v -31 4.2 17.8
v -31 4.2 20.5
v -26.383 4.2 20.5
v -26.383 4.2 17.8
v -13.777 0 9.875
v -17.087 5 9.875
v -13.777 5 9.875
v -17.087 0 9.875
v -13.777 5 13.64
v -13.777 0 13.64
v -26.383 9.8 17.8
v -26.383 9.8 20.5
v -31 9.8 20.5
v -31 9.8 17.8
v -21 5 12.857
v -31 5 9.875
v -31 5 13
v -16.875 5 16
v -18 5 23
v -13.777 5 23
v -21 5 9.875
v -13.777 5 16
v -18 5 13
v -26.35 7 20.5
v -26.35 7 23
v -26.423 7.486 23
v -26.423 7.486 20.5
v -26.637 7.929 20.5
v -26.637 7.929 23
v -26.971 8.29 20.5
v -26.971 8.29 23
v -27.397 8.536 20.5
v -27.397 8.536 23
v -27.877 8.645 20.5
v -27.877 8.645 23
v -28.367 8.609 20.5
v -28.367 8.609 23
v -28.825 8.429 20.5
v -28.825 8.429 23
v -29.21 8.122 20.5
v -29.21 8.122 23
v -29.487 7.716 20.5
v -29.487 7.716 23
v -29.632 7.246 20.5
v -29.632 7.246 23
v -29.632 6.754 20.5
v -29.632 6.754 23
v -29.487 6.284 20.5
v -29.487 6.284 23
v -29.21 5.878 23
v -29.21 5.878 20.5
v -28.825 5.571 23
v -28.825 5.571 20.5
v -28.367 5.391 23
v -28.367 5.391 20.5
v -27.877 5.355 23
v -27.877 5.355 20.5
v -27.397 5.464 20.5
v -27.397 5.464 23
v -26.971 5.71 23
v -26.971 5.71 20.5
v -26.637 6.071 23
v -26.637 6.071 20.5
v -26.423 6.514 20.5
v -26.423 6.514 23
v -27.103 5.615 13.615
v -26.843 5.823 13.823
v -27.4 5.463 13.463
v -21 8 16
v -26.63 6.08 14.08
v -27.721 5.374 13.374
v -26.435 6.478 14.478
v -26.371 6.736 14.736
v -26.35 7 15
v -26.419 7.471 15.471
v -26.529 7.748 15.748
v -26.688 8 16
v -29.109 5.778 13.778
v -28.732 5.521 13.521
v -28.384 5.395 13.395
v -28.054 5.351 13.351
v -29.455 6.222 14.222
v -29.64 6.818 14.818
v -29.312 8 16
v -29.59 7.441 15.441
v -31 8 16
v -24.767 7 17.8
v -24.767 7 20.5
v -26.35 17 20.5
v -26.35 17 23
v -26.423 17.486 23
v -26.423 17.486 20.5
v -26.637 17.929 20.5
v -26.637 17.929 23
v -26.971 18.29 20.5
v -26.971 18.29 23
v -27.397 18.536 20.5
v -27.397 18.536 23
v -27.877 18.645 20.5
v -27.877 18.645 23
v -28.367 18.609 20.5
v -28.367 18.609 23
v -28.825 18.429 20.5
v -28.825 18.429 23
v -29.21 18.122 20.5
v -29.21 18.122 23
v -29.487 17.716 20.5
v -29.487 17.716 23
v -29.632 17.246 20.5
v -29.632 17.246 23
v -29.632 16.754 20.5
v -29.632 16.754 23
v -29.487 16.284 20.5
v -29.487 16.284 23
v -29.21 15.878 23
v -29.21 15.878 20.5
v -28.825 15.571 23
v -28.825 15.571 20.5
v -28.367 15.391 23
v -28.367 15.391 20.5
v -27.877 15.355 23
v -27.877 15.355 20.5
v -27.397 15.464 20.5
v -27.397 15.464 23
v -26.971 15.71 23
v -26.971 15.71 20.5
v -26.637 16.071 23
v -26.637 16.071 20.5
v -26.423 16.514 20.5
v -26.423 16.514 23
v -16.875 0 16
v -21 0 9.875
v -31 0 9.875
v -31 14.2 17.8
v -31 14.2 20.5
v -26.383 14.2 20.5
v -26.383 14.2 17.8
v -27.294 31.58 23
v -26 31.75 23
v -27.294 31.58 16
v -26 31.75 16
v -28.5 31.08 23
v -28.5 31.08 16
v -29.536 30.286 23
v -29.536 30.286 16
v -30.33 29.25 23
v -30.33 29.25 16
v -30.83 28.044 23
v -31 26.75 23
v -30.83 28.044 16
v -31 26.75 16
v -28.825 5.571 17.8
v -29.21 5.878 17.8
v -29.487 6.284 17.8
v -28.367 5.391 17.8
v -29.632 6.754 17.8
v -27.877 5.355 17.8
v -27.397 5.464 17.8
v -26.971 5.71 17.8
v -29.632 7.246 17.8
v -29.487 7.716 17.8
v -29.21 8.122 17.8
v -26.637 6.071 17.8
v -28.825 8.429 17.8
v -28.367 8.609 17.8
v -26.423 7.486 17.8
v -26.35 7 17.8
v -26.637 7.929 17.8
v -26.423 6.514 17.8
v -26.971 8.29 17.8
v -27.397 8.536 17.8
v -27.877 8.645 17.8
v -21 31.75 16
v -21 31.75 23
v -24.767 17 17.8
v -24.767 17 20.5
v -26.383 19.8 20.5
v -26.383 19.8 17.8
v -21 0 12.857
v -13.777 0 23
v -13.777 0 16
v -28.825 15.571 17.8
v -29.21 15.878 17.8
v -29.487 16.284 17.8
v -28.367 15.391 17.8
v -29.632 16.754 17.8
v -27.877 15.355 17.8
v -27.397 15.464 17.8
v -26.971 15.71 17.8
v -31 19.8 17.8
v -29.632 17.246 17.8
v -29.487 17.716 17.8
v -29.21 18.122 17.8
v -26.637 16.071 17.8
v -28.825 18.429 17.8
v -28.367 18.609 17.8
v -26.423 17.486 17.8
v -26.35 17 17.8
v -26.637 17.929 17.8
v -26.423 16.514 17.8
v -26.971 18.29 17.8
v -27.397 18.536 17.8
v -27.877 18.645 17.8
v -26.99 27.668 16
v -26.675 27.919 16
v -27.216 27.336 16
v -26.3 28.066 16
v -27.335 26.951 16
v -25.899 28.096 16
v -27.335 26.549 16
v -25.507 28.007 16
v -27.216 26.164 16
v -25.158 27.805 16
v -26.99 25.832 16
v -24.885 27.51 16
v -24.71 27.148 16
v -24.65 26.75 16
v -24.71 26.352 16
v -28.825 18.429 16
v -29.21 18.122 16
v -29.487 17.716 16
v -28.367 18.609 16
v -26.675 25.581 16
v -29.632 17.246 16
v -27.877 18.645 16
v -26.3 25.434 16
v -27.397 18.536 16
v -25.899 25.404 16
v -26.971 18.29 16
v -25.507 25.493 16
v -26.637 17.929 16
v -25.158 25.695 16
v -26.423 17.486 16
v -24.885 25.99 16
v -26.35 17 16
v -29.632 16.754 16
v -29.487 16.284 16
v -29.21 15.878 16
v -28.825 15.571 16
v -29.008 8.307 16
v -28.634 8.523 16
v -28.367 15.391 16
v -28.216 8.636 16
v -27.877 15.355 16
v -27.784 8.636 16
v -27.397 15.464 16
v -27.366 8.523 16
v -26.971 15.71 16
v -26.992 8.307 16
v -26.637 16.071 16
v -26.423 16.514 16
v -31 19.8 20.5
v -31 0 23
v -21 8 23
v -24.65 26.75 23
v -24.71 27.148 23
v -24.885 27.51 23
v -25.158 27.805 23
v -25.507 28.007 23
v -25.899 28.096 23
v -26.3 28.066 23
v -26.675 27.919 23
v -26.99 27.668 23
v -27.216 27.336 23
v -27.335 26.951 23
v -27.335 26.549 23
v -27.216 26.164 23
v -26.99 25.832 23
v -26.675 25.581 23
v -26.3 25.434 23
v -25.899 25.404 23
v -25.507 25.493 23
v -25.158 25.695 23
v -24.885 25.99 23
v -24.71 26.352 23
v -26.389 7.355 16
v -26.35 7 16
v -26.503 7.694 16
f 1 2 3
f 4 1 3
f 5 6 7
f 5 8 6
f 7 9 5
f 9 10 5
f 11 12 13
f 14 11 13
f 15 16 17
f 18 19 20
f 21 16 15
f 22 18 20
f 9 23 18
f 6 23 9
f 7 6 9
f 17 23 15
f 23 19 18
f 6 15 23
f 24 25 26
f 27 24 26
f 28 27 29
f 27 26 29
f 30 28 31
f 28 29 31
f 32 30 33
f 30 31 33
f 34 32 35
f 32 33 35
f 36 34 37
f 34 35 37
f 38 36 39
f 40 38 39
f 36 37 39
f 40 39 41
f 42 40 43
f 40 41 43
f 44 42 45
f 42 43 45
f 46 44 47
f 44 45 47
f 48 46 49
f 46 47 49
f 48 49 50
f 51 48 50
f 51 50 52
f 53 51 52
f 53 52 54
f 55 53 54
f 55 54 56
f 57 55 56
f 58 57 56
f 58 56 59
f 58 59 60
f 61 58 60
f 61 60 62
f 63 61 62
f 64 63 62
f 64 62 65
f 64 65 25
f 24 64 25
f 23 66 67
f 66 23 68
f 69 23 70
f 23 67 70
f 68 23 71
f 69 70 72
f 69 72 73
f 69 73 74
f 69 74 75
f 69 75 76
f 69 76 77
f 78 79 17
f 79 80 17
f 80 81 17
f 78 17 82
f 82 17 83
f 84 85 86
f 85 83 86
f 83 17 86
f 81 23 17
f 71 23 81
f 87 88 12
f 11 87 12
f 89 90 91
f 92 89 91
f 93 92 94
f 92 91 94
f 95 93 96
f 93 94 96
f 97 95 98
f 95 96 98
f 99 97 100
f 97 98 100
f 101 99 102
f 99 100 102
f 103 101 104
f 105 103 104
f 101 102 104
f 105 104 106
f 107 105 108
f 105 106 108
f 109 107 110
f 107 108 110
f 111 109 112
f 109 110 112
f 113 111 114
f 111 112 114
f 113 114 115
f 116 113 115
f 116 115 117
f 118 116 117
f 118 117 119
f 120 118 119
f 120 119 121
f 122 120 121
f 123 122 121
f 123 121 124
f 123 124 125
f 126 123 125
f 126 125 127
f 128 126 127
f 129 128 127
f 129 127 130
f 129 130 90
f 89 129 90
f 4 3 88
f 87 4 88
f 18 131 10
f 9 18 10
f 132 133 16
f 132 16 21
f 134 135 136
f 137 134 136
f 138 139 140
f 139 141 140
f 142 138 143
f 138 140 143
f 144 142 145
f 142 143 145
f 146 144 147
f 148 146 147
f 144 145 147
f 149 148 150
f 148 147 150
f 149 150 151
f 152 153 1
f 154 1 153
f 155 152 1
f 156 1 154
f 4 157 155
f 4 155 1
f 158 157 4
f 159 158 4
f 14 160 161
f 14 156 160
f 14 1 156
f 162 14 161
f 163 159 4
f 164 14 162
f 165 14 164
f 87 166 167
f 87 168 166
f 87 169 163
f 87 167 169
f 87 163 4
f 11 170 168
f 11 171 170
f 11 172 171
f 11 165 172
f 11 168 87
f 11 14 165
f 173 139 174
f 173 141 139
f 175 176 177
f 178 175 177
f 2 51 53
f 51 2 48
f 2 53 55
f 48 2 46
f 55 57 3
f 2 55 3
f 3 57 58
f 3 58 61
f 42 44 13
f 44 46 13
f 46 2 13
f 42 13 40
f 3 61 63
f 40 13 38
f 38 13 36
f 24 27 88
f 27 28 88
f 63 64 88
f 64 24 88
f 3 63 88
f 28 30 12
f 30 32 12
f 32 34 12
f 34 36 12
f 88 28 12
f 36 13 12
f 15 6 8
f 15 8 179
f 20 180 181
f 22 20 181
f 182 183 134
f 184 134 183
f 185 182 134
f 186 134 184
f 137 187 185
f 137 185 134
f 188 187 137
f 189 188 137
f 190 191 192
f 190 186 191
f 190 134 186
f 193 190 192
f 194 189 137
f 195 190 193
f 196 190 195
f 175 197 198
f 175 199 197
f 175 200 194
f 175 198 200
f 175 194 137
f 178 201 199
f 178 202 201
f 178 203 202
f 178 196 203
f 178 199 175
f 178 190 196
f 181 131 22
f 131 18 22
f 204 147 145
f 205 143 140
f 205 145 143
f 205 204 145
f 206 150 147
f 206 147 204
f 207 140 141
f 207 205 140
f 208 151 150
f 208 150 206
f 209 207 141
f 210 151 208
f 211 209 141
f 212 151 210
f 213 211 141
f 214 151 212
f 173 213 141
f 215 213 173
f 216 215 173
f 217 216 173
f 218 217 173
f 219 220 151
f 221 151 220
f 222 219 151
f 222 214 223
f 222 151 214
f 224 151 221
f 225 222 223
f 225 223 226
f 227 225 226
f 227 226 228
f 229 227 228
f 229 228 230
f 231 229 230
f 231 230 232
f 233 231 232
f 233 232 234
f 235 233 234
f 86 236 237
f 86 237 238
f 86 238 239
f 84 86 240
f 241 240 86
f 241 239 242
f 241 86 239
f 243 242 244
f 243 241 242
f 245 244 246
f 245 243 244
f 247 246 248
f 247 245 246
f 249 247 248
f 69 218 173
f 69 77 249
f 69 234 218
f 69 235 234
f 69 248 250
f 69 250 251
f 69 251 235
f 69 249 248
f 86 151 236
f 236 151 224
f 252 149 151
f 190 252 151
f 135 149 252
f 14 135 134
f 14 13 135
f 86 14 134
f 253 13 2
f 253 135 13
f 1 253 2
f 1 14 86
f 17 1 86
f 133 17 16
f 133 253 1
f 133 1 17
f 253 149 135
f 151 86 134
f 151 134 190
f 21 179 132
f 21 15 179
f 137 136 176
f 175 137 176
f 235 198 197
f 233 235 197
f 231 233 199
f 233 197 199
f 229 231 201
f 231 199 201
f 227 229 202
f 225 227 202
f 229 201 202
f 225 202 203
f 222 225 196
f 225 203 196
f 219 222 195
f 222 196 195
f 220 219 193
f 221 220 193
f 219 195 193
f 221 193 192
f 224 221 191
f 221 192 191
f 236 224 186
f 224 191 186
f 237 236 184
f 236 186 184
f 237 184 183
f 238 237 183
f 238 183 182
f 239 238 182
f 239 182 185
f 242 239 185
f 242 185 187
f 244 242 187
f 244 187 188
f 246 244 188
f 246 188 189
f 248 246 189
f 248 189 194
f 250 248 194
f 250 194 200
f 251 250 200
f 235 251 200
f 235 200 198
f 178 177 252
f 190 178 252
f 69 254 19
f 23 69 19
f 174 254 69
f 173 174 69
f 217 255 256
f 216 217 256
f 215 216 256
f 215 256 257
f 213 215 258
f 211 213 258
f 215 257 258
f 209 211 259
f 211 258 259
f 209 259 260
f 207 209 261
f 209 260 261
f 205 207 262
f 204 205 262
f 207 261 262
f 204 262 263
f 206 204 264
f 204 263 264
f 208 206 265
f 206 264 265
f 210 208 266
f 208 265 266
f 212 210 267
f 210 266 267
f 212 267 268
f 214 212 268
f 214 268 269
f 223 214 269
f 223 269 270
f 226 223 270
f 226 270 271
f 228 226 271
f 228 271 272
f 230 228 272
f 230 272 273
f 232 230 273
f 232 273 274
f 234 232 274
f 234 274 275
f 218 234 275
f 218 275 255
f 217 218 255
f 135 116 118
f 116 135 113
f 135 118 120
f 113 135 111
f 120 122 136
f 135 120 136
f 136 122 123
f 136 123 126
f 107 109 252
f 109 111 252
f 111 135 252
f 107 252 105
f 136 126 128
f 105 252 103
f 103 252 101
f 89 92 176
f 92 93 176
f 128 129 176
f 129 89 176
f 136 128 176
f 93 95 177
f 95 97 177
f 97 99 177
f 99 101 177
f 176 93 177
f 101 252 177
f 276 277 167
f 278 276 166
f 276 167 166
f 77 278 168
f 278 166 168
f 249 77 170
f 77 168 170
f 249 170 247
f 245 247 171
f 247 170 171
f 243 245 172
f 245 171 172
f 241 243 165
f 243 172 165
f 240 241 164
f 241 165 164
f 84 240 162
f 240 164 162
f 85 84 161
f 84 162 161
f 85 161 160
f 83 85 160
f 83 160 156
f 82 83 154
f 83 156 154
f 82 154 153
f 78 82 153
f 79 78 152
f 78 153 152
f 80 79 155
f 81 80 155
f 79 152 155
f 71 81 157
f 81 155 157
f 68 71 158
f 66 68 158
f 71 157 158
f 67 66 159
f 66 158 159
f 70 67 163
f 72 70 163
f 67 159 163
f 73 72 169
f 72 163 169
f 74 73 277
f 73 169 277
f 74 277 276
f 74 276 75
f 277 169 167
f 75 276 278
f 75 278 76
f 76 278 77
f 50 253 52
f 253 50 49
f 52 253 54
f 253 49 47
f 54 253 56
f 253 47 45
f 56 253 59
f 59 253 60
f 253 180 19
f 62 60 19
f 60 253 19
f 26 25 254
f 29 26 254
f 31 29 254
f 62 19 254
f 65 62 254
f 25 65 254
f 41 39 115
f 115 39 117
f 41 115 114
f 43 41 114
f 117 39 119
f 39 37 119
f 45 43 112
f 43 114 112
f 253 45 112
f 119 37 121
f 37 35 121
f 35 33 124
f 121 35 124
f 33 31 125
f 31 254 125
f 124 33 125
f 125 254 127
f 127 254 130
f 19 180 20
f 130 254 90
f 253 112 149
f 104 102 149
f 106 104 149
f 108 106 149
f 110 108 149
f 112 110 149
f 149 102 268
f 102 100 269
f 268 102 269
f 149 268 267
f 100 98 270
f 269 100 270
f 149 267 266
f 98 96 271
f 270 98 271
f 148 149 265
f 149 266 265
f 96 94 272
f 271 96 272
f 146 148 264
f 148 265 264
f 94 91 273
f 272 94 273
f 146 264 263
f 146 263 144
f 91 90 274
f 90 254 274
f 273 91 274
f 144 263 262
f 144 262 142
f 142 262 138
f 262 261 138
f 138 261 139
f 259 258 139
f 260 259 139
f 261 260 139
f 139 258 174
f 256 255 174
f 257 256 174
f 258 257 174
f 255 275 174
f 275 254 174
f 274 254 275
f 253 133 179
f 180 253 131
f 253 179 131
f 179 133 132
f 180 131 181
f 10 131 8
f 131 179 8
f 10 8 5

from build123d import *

# Parameters (mm, degrees)
SKETCH_1_W           = 62
SKETCH_1_H           = 46
EXTRUDE_1_DEPTH      = 5
SKETCH_2_W           = 10
SKETCH_2_H           = 17
EXTRUDE_2_DEPTH      = 7
SKETCH_3_R           = 1.65
CUT_EXTRUDE_1_DEPTH  = 12
SKETCH_7_W           = 10
SKETCH_7_H           = 7
EXTRUDE_4_DEPTH      = 9.75
CUT_EXTRUDE_4_REACH  = 65.914
SKETCH_8_R           = 1.35
CUT_EXTRUDE_2_DEPTH  = 2.7
CUT_EXTRUDE_3_REACH  = 51.981
SKETCH_5_W           = 42
SKETCH_5_H           = 32
EXTRUDE_3_DEPTH      = 5
CHAMFER_4_SIZE       = 3
FILLET_1_R           = 5
SKETCH_9_OUTSIDE_W   = 80.694
SKETCH_9_OUTSIDE_H   = 64.694
SKETCH_9_OUTSIDE_W_2 = 19.744354218
SKETCH_9_OUTSIDE_H_2 = 18.428063936
CUT_EXTRUDE_5_DEPTH  = 31.75


with BuildPart() as part:
    # 草图1 → 凸台-拉伸1 (new body)
    with BuildSketch(Plane(origin=(0, 0, 0), x_dir=(1, 0, 0), z_dir=(0, 1, 0))):
        Rectangle(SKETCH_1_W, SKETCH_1_H)
    extrude(amount=EXTRUDE_1_DEPTH)

    # 草图2 → 凸台-拉伸2 (add)
    with BuildSketch(Plane.XY.offset(23)):
        with Locations((-26, 13.5)):
            Rectangle(SKETCH_2_W, SKETCH_2_H)
        with Locations((26, 13.5)):
            Rectangle(SKETCH_2_W, SKETCH_2_H)
    extrude_2 = extrude(amount=-EXTRUDE_2_DEPTH)

    # 草图3 → 切除-拉伸1 (cut)
    with BuildSketch(Plane.XY.offset(23)):
        with Locations((-28, 17)):
            Circle(SKETCH_3_R)
        with Locations((-28, 7)):
            Circle(SKETCH_3_R)
        with Locations((28, 7)):
            Circle(SKETCH_3_R)
        with Locations((28, 17)):
            Circle(SKETCH_3_R)
    cut_extrude_1 = extrude(amount=-CUT_EXTRUDE_1_DEPTH, mode=Mode.SUBTRACT)

    # 草图7 → 凸台-拉伸4 (add)
    with BuildSketch(Plane(origin=(0, 22, 0), x_dir=(1, 0, 0), z_dir=(0, 1, 0))):
        with Locations((-26, -19.5)):
            Rectangle(SKETCH_7_W, SKETCH_7_H)
        with Locations((26, -19.5)):
            Rectangle(SKETCH_7_W, SKETCH_7_H)
    extrude_4 = extrude(amount=EXTRUDE_4_DEPTH)

    # 草图8 → 切除-拉伸4 (cut, up to next)
    with BuildSketch(Plane.XY.offset(23), mode=Mode.PRIVATE) as cut_extrude_4_sk1:
        with Locations((-26, 26.75)):
            Circle(SKETCH_8_R)
    cut_extrude_4_tool1 = extrude(cut_extrude_4_sk1.sketch, amount=-CUT_EXTRUDE_4_REACH, mode=Mode.PRIVATE) & part.part
    # 草图8 → 切除-拉伸4 (cut, up to next)
    with BuildSketch(Plane.XY.offset(23), mode=Mode.PRIVATE) as cut_extrude_4_sk2:
        with Locations((26, 26.75)):
            Circle(SKETCH_8_R)
    cut_extrude_4_tool2 = extrude(cut_extrude_4_sk2.sketch, amount=-CUT_EXTRUDE_4_REACH, mode=Mode.PRIVATE) & part.part
    cut_extrude_4_1 = cut_extrude_4_tool1.solids().sort_by_distance((-26, 26.75, 23))[0]
    add(cut_extrude_4_1, mode=Mode.SUBTRACT)
    cut_extrude_4_2 = cut_extrude_4_tool2.solids().sort_by_distance((26, 26.75, 23))[0]
    add(cut_extrude_4_2, mode=Mode.SUBTRACT)
    cut_extrude_4 = cut_extrude_4_1 + cut_extrude_4_2  # 切除-拉伸4 as one shape, for the pattern or mirror that repeats it

    # 草图4 → 切除-拉伸2 (cut)
    with BuildSketch(Plane.XY.offset(20.5)):
        Polygon((-29.616580754, 19.8), (-31.233161507, 19.8), (-31.233161507, 17), (-31.233161507, 14.2), (-29.616580754, 14.2), (-26.383419246, 14.2), (-24.766838493, 17), (-26.383419246, 19.8), align=None)
        Polygon((-24.766838493, 7), (-26.383419246, 9.8), (-29.616580754, 9.8), (-31.233161507, 9.8), (-31.233161507, 7), (-31.233161507, 4.2), (-29.616580754, 4.2), (-26.383419246, 4.2), align=None)
        Polygon((24.766838493, 17), (26.383419246, 14.2), (29.616580754, 14.2), (31.233161507, 14.2), (31.233161507, 17), (31.233161507, 19.8), (29.616580754, 19.8), (26.383419246, 19.8), align=None)
        Polygon((24.766838493, 7), (26.383419246, 4.2), (29.616580754, 4.2), (31.233161507, 4.2), (31.233161507, 7), (31.233161507, 9.8), (29.616580754, 9.8), (26.383419246, 9.8), align=None)
    cut_extrude_2 = extrude(amount=-CUT_EXTRUDE_2_DEPTH, mode=Mode.SUBTRACT)

    # 镜向1: 凸台-拉伸2, 切除-拉伸1, 凸台-拉伸4, 切除-拉伸4, 切除-拉伸2 across plane
    add(extrude_2.mirror(Plane.XY))
    add(cut_extrude_1.mirror(Plane.XY), mode=Mode.SUBTRACT)
    add(extrude_4.mirror(Plane.XY))
    add(cut_extrude_4.mirror(Plane.XY), mode=Mode.SUBTRACT)
    add(cut_extrude_2.mirror(Plane.XY), mode=Mode.SUBTRACT)

    # 草图5 → 切除-拉伸3 (cut, up to next)
    with BuildSketch(Plane(origin=(0, 31.75, 0), x_dir=(1, 0, 0), z_dir=(0, 1, 0)), mode=Mode.PRIVATE) as cut_extrude_3_sk1:
        Rectangle(SKETCH_5_W, SKETCH_5_H)
    cut_extrude_3_tool1 = extrude(cut_extrude_3_sk1.sketch, amount=-CUT_EXTRUDE_3_REACH, mode=Mode.PRIVATE) & part.part
    add(cut_extrude_3_tool1.solids().sort_by_distance((0, 31.75, 0))[0], mode=Mode.SUBTRACT)

    # 草图6 → 凸台-拉伸3 (add)
    with BuildSketch(Plane(origin=(0, 0, 0), x_dir=(1, 0, 0), z_dir=(0, 1, 0))):
        Polygon((-22.515108038, 14.0114207), (-4.12511837, 0), (0, 3.142947329), (-19.484891962, 17.9885793), align=None)
        Polygon((0, 3.142947329), (4.12511837, 0), (22.515108038, 14.0114207), (19.484891962, 17.9885793), align=None)
        Polygon((-4.12511837, 0), (0, -3.142947329), (4.12511837, 0), (0, 3.142947329), align=None)
        Polygon((-19.484891962, -17.9885793), (0, -3.142947329), (-4.12511837, 0), (-22.515108038, -14.0114207), align=None)
        Polygon((0, -3.142947329), (19.484891962, -17.9885793), (22.515108038, -14.0114207), (4.12511837, 0), align=None)
    extrude(amount=EXTRUDE_3_DEPTH)

    # 倒角4
    # the kernel refuses this chamfer: 3 mm, written as the material it adds along each edge
    with BuildSketch(Plane(origin=(-31, 5, 16), x_dir=(0, -0.027495876610586494, -0.9996219169112968), z_dir=(1, 0, 0))) as chamfer_4_piece_1_section:
        Polygon((CHAMFER_4_SIZE * 0.999621916911, CHAMFER_4_SIZE * 0.0274958766106), (-CHAMFER_4_SIZE * 0.0274958766106, CHAMFER_4_SIZE * 0.999621916911), (0, 0), align=None)
    chamfer_4_piece_1 = extrude(amount=10, mode=Mode.PRIVATE)
    chamfer_4_piece_1 = chamfer_4_piece_1 - Plane(origin=(-28, 7, 14.954388988), x_dir=(1, 0, 0), z_dir=(0, 0, 1)) * Cylinder(1.65, 32, mode=Mode.PRIVATE)
    add(chamfer_4_piece_1)
    with BuildSketch(Plane(origin=(-21, 5, 23), x_dir=(-0.02749587661058678, 0.9996219169112968, 0), z_dir=(0, 0, -1)), Plane(origin=(-21, 5, -23), x_dir=(0.9996219169112968, -0.02749587661058648, 0), z_dir=(0, 0, 1)), Plane(origin=(21, 5, 23), x_dir=(-0.9996219169112968, -0.02749587661058619, 0), z_dir=(0, 0, -1))) as chamfer_4_piece_2:
        Polygon((CHAMFER_4_SIZE * 0.999621916911, CHAMFER_4_SIZE * 0.0274958766106), (-CHAMFER_4_SIZE * 0.0274958766106, CHAMFER_4_SIZE * 0.999621916911), (0, 0), align=None)
    extrude(amount=7)
    with BuildSketch(Plane(origin=(-31, 5, -16), x_dir=(0, -0.027495876610586494, 0.9996219169112968), z_dir=(1, 0, 0))) as chamfer_4_piece_3_section:
        Polygon((CHAMFER_4_SIZE * 0.999621916911, -CHAMFER_4_SIZE * 0.0274958766106), (-CHAMFER_4_SIZE * 0.0274958766106, -CHAMFER_4_SIZE * 0.999621916911), (0, 0), align=None)
    chamfer_4_piece_3 = extrude(amount=10, mode=Mode.PRIVATE)
    chamfer_4_piece_3 = chamfer_4_piece_3 - Plane(origin=(-28, 7, -14.954388988), x_dir=(1, 0, 0), z_dir=(0, 0, -1)) * Cylinder(1.65, 32, mode=Mode.PRIVATE)
    add(chamfer_4_piece_3)
    with BuildSketch(Plane(origin=(21, 5, -23), x_dir=(-0.9996219169112968, -0.02749587661058619, 0), z_dir=(0, 0, 1))) as chamfer_4_piece_4:
        Polygon((CHAMFER_4_SIZE * 0.999621916911, -CHAMFER_4_SIZE * 0.0274958766106), (-CHAMFER_4_SIZE * 0.0274958766106, -CHAMFER_4_SIZE * 0.999621916911), (0, 0), align=None)
    extrude(amount=7)
    with BuildSketch(Plane(origin=(31, 5, -16), x_dir=(0, -0.027495876610586494, 0.9996219169112968), z_dir=(-1, 0, 0))) as chamfer_4_piece_5_section:
        Polygon((CHAMFER_4_SIZE * 0.999621916911, CHAMFER_4_SIZE * 0.0274958766106), (-CHAMFER_4_SIZE * 0.0274958766106, CHAMFER_4_SIZE * 0.999621916911), (0, 0), align=None)
    chamfer_4_piece_5 = extrude(amount=10, mode=Mode.PRIVATE)
    chamfer_4_piece_5 = chamfer_4_piece_5 - Plane(origin=(28, 7, -14.954389008), x_dir=(1, 0, 0), z_dir=(0, 0, -1)) * Cylinder(1.65, 32, mode=Mode.PRIVATE)
    add(chamfer_4_piece_5)
    with BuildSketch(Plane(origin=(31, 5, 16), x_dir=(0, -0.027495876610586494, -0.9996219169112968), z_dir=(-1, 0, 0))) as chamfer_4_piece_6_section:
        Polygon((CHAMFER_4_SIZE * 0.999621916911, -CHAMFER_4_SIZE * 0.0274958766106), (-CHAMFER_4_SIZE * 0.0274958766106, -CHAMFER_4_SIZE * 0.999621916911), (0, 0), align=None)
    chamfer_4_piece_6 = extrude(amount=10, mode=Mode.PRIVATE)
    chamfer_4_piece_6 = chamfer_4_piece_6 - Plane(origin=(28, 7, 14.954389008), x_dir=(1, 0, 0), z_dir=(0, 0, 1)) * Cylinder(1.65, 32, mode=Mode.PRIVATE)
    add(chamfer_4_piece_6)
    with BuildSketch(Plane(origin=(-21, 5, 23), x_dir=(-0.02749587661058678, 0.9996219169112968, 0), z_dir=(0, 0, -1))) as chamfer_4_piece_7a_section:
        Polygon((CHAMFER_4_SIZE * 0.999621916911, CHAMFER_4_SIZE * 0.0274958766106), (-CHAMFER_4_SIZE * 0.0274958766106, CHAMFER_4_SIZE * 0.999621916911), (0, 0), align=None)
    chamfer_4_piece_7a = extrude(amount=14.715048964, mode=Mode.PRIVATE)
    chamfer_4_piece_7a = split(chamfer_4_piece_7a, bisect_by=Plane(origin=(-19.8988735, 5.929641192, 16), z_dir=(0, 0, -1)), keep=Keep.TOP, mode=Mode.PRIVATE)
    chamfer_4_piece_7a = split(chamfer_4_piece_7a, bisect_by=Plane(origin=(-20.858643002, 5.929641192, 12.749352101), z_dir=(0.6060432152628566, 0, 0.7954317200324984)), keep=Keep.TOP, mode=Mode.PRIVATE)
    with BuildSketch(Plane(origin=(-31, 5, 16), x_dir=(0, -0.027495876610586494, -0.9996219169112968), z_dir=(1, 0, 0))) as chamfer_4_piece_7b_section:
        Polygon((CHAMFER_4_SIZE * 0.999621916911, CHAMFER_4_SIZE * 0.0274958766106), (-CHAMFER_4_SIZE * 0.0274958766106, CHAMFER_4_SIZE * 0.999621916911), (0, 0), align=None)
    chamfer_4_piece_7b = extrude(amount=17.715048964, mode=Mode.PRIVATE)
    chamfer_4_piece_7b = split(chamfer_4_piece_7b, bisect_by=Plane(origin=(-21, 5.915915897, 14.873215442), z_dir=(1, 0, 0)), keep=Keep.TOP, mode=Mode.PRIVATE)
    chamfer_4_piece_7b = split(chamfer_4_piece_7b, bisect_by=Plane(origin=(-17.170062576, 5.915915897, 16.224899768), z_dir=(-0.6060432152628568, 0, -0.7954317200324983)), keep=Keep.TOP, mode=Mode.PRIVATE)
    chamfer_4_piece_7 = chamfer_4_piece_7a & chamfer_4_piece_7b
    add(chamfer_4_piece_7)
    with BuildSketch(Plane(origin=(-21, 5, -23), x_dir=(0.9996219169112968, -0.02749587661058648, 0), z_dir=(0, 0, 1))) as chamfer_4_piece_8a_section:
        Polygon((CHAMFER_4_SIZE * 0.999621916911, CHAMFER_4_SIZE * 0.0274958766106), (-CHAMFER_4_SIZE * 0.0274958766106, CHAMFER_4_SIZE * 0.999621916911), (0, 0), align=None)
    chamfer_4_piece_8a = extrude(amount=14.715048964, mode=Mode.PRIVATE)
    chamfer_4_piece_8a = split(chamfer_4_piece_8a, bisect_by=Plane(origin=(-20.858643002, 5.929641192, -12.749352101), z_dir=(0.6060432152628563, 0, -0.7954317200324986)), keep=Keep.TOP, mode=Mode.PRIVATE)
    chamfer_4_piece_8a = split(chamfer_4_piece_8a, bisect_by=Plane(origin=(-19.8988735, 5.929641192, -16), z_dir=(0, 0, 1)), keep=Keep.TOP, mode=Mode.PRIVATE)
    with BuildSketch(Plane(origin=(-31, 5, -16), x_dir=(0, -0.027495876610586494, 0.9996219169112968), z_dir=(1, 0, 0))) as chamfer_4_piece_8b_section:
        Polygon((CHAMFER_4_SIZE * 0.999621916911, -CHAMFER_4_SIZE * 0.0274958766106), (-CHAMFER_4_SIZE * 0.0274958766106, -CHAMFER_4_SIZE * 0.999621916911), (0, 0), align=None)
    chamfer_4_piece_8b = extrude(amount=17.715048964, mode=Mode.PRIVATE)
    chamfer_4_piece_8b = split(chamfer_4_piece_8b, bisect_by=Plane(origin=(-17.170062576, 5.915915897, -16.224899768), z_dir=(-0.6060432152628565, 0, 0.7954317200324984)), keep=Keep.TOP, mode=Mode.PRIVATE)
    chamfer_4_piece_8b = split(chamfer_4_piece_8b, bisect_by=Plane(origin=(-21, 5.915915897, -14.873215442), z_dir=(1, 0, 0)), keep=Keep.TOP, mode=Mode.PRIVATE)
    chamfer_4_piece_8 = chamfer_4_piece_8a & chamfer_4_piece_8b
    add(chamfer_4_piece_8)
    with BuildSketch(Plane(origin=(31, 5, -16), x_dir=(0, -0.027495876610586494, 0.9996219169112968), z_dir=(-1, 0, 0))) as chamfer_4_piece_9a_section:
        Polygon((CHAMFER_4_SIZE * 0.999621916911, CHAMFER_4_SIZE * 0.0274958766106), (-CHAMFER_4_SIZE * 0.0274958766106, CHAMFER_4_SIZE * 0.999621916911), (0, 0), align=None)
    chamfer_4_piece_9a = extrude(amount=17.715048964, mode=Mode.PRIVATE)
    chamfer_4_piece_9a = split(chamfer_4_piece_9a, bisect_by=Plane(origin=(17.170062576, 5.915915897, -16.224899768), z_dir=(0.6060432152628568, 0, 0.7954317200324984)), keep=Keep.TOP, mode=Mode.PRIVATE)
    chamfer_4_piece_9a = split(chamfer_4_piece_9a, bisect_by=Plane(origin=(21, 5.915915897, -14.873215442), z_dir=(-1, 0, 0)), keep=Keep.TOP, mode=Mode.PRIVATE)
    with BuildSketch(Plane(origin=(21, 5, -23), x_dir=(-0.9996219169112968, -0.02749587661058619, 0), z_dir=(0, 0, 1))) as chamfer_4_piece_9b_section:
        Polygon((CHAMFER_4_SIZE * 0.999621916911, -CHAMFER_4_SIZE * 0.0274958766106), (-CHAMFER_4_SIZE * 0.0274958766106, -CHAMFER_4_SIZE * 0.999621916911), (0, 0), align=None)
    chamfer_4_piece_9b = extrude(amount=14.715048964, mode=Mode.PRIVATE)
    chamfer_4_piece_9b = split(chamfer_4_piece_9b, bisect_by=Plane(origin=(20.858643002, 5.929641192, -12.749352101), z_dir=(-0.6060432152628568, 0, -0.7954317200324983)), keep=Keep.TOP, mode=Mode.PRIVATE)
    chamfer_4_piece_9b = split(chamfer_4_piece_9b, bisect_by=Plane(origin=(19.8988735, 5.929641192, -16), z_dir=(0, 0, 1)), keep=Keep.TOP, mode=Mode.PRIVATE)
    chamfer_4_piece_9 = chamfer_4_piece_9a & chamfer_4_piece_9b
    add(chamfer_4_piece_9)
    with BuildSketch(Plane(origin=(21, 5, 23), x_dir=(-0.9996219169112968, -0.02749587661058619, 0), z_dir=(0, 0, -1))) as chamfer_4_piece_10a_section:
        Polygon((CHAMFER_4_SIZE * 0.999621916911, CHAMFER_4_SIZE * 0.0274958766106), (-CHAMFER_4_SIZE * 0.0274958766106, CHAMFER_4_SIZE * 0.999621916911), (0, 0), align=None)
    chamfer_4_piece_10a = extrude(amount=14.715048964, mode=Mode.PRIVATE)
    chamfer_4_piece_10a = split(chamfer_4_piece_10a, bisect_by=Plane(origin=(20.858643002, 5.929641192, 12.749352101), z_dir=(-0.6060432152628565, 0, 0.7954317200324984)), keep=Keep.TOP, mode=Mode.PRIVATE)
    chamfer_4_piece_10a = split(chamfer_4_piece_10a, bisect_by=Plane(origin=(19.8988735, 5.929641192, 16), z_dir=(0, 0, -1)), keep=Keep.TOP, mode=Mode.PRIVATE)
    with BuildSketch(Plane(origin=(31, 5, 16), x_dir=(0, -0.027495876610586494, -0.9996219169112968), z_dir=(-1, 0, 0))) as chamfer_4_piece_10b_section:
        Polygon((CHAMFER_4_SIZE * 0.999621916911, -CHAMFER_4_SIZE * 0.0274958766106), (-CHAMFER_4_SIZE * 0.0274958766106, -CHAMFER_4_SIZE * 0.999621916911), (0, 0), align=None)
    chamfer_4_piece_10b = extrude(amount=17.715048964, mode=Mode.PRIVATE)
    chamfer_4_piece_10b = split(chamfer_4_piece_10b, bisect_by=Plane(origin=(17.170062576, 5.915915897, 16.224899768), z_dir=(0.6060432152628563, 0, -0.7954317200324986)), keep=Keep.TOP, mode=Mode.PRIVATE)
    chamfer_4_piece_10b = split(chamfer_4_piece_10b, bisect_by=Plane(origin=(21, 5.915915897, 14.873215442), z_dir=(-1, 0, 0)), keep=Keep.TOP, mode=Mode.PRIVATE)
    chamfer_4_piece_10 = chamfer_4_piece_10a & chamfer_4_piece_10b
    add(chamfer_4_piece_10)

    # 圆角1
    fillet_1_edges = [part.edges().sort_by_distance(p)[0] for p in [
        (-31, 31.75, -19.5),
        (31, 31.75, -19.5),
        (-31, 31.75, 19.5),
        (31, 31.75, 19.5),
    ]]
    fillet(fillet_1_edges, radius=FILLET_1_R)

    # 草图9 outside → 切除-拉伸5 (cut)
    with BuildSketch(Plane(origin=(0, 0, 0), x_dir=(1, 0, 0), z_dir=(0, 1, 0))):
        Rectangle(SKETCH_9_OUTSIDE_W, SKETCH_9_OUTSIDE_H)
        with Locations((-23.649265304, -19.089518312)):
            Rectangle(SKETCH_9_OUTSIDE_W_2, SKETCH_9_OUTSIDE_H_2, mode=Mode.SUBTRACT)
    extrude(amount=CUT_EXTRUDE_5_DEPTH, mode=Mode.SUBTRACT)


solid = part.part
